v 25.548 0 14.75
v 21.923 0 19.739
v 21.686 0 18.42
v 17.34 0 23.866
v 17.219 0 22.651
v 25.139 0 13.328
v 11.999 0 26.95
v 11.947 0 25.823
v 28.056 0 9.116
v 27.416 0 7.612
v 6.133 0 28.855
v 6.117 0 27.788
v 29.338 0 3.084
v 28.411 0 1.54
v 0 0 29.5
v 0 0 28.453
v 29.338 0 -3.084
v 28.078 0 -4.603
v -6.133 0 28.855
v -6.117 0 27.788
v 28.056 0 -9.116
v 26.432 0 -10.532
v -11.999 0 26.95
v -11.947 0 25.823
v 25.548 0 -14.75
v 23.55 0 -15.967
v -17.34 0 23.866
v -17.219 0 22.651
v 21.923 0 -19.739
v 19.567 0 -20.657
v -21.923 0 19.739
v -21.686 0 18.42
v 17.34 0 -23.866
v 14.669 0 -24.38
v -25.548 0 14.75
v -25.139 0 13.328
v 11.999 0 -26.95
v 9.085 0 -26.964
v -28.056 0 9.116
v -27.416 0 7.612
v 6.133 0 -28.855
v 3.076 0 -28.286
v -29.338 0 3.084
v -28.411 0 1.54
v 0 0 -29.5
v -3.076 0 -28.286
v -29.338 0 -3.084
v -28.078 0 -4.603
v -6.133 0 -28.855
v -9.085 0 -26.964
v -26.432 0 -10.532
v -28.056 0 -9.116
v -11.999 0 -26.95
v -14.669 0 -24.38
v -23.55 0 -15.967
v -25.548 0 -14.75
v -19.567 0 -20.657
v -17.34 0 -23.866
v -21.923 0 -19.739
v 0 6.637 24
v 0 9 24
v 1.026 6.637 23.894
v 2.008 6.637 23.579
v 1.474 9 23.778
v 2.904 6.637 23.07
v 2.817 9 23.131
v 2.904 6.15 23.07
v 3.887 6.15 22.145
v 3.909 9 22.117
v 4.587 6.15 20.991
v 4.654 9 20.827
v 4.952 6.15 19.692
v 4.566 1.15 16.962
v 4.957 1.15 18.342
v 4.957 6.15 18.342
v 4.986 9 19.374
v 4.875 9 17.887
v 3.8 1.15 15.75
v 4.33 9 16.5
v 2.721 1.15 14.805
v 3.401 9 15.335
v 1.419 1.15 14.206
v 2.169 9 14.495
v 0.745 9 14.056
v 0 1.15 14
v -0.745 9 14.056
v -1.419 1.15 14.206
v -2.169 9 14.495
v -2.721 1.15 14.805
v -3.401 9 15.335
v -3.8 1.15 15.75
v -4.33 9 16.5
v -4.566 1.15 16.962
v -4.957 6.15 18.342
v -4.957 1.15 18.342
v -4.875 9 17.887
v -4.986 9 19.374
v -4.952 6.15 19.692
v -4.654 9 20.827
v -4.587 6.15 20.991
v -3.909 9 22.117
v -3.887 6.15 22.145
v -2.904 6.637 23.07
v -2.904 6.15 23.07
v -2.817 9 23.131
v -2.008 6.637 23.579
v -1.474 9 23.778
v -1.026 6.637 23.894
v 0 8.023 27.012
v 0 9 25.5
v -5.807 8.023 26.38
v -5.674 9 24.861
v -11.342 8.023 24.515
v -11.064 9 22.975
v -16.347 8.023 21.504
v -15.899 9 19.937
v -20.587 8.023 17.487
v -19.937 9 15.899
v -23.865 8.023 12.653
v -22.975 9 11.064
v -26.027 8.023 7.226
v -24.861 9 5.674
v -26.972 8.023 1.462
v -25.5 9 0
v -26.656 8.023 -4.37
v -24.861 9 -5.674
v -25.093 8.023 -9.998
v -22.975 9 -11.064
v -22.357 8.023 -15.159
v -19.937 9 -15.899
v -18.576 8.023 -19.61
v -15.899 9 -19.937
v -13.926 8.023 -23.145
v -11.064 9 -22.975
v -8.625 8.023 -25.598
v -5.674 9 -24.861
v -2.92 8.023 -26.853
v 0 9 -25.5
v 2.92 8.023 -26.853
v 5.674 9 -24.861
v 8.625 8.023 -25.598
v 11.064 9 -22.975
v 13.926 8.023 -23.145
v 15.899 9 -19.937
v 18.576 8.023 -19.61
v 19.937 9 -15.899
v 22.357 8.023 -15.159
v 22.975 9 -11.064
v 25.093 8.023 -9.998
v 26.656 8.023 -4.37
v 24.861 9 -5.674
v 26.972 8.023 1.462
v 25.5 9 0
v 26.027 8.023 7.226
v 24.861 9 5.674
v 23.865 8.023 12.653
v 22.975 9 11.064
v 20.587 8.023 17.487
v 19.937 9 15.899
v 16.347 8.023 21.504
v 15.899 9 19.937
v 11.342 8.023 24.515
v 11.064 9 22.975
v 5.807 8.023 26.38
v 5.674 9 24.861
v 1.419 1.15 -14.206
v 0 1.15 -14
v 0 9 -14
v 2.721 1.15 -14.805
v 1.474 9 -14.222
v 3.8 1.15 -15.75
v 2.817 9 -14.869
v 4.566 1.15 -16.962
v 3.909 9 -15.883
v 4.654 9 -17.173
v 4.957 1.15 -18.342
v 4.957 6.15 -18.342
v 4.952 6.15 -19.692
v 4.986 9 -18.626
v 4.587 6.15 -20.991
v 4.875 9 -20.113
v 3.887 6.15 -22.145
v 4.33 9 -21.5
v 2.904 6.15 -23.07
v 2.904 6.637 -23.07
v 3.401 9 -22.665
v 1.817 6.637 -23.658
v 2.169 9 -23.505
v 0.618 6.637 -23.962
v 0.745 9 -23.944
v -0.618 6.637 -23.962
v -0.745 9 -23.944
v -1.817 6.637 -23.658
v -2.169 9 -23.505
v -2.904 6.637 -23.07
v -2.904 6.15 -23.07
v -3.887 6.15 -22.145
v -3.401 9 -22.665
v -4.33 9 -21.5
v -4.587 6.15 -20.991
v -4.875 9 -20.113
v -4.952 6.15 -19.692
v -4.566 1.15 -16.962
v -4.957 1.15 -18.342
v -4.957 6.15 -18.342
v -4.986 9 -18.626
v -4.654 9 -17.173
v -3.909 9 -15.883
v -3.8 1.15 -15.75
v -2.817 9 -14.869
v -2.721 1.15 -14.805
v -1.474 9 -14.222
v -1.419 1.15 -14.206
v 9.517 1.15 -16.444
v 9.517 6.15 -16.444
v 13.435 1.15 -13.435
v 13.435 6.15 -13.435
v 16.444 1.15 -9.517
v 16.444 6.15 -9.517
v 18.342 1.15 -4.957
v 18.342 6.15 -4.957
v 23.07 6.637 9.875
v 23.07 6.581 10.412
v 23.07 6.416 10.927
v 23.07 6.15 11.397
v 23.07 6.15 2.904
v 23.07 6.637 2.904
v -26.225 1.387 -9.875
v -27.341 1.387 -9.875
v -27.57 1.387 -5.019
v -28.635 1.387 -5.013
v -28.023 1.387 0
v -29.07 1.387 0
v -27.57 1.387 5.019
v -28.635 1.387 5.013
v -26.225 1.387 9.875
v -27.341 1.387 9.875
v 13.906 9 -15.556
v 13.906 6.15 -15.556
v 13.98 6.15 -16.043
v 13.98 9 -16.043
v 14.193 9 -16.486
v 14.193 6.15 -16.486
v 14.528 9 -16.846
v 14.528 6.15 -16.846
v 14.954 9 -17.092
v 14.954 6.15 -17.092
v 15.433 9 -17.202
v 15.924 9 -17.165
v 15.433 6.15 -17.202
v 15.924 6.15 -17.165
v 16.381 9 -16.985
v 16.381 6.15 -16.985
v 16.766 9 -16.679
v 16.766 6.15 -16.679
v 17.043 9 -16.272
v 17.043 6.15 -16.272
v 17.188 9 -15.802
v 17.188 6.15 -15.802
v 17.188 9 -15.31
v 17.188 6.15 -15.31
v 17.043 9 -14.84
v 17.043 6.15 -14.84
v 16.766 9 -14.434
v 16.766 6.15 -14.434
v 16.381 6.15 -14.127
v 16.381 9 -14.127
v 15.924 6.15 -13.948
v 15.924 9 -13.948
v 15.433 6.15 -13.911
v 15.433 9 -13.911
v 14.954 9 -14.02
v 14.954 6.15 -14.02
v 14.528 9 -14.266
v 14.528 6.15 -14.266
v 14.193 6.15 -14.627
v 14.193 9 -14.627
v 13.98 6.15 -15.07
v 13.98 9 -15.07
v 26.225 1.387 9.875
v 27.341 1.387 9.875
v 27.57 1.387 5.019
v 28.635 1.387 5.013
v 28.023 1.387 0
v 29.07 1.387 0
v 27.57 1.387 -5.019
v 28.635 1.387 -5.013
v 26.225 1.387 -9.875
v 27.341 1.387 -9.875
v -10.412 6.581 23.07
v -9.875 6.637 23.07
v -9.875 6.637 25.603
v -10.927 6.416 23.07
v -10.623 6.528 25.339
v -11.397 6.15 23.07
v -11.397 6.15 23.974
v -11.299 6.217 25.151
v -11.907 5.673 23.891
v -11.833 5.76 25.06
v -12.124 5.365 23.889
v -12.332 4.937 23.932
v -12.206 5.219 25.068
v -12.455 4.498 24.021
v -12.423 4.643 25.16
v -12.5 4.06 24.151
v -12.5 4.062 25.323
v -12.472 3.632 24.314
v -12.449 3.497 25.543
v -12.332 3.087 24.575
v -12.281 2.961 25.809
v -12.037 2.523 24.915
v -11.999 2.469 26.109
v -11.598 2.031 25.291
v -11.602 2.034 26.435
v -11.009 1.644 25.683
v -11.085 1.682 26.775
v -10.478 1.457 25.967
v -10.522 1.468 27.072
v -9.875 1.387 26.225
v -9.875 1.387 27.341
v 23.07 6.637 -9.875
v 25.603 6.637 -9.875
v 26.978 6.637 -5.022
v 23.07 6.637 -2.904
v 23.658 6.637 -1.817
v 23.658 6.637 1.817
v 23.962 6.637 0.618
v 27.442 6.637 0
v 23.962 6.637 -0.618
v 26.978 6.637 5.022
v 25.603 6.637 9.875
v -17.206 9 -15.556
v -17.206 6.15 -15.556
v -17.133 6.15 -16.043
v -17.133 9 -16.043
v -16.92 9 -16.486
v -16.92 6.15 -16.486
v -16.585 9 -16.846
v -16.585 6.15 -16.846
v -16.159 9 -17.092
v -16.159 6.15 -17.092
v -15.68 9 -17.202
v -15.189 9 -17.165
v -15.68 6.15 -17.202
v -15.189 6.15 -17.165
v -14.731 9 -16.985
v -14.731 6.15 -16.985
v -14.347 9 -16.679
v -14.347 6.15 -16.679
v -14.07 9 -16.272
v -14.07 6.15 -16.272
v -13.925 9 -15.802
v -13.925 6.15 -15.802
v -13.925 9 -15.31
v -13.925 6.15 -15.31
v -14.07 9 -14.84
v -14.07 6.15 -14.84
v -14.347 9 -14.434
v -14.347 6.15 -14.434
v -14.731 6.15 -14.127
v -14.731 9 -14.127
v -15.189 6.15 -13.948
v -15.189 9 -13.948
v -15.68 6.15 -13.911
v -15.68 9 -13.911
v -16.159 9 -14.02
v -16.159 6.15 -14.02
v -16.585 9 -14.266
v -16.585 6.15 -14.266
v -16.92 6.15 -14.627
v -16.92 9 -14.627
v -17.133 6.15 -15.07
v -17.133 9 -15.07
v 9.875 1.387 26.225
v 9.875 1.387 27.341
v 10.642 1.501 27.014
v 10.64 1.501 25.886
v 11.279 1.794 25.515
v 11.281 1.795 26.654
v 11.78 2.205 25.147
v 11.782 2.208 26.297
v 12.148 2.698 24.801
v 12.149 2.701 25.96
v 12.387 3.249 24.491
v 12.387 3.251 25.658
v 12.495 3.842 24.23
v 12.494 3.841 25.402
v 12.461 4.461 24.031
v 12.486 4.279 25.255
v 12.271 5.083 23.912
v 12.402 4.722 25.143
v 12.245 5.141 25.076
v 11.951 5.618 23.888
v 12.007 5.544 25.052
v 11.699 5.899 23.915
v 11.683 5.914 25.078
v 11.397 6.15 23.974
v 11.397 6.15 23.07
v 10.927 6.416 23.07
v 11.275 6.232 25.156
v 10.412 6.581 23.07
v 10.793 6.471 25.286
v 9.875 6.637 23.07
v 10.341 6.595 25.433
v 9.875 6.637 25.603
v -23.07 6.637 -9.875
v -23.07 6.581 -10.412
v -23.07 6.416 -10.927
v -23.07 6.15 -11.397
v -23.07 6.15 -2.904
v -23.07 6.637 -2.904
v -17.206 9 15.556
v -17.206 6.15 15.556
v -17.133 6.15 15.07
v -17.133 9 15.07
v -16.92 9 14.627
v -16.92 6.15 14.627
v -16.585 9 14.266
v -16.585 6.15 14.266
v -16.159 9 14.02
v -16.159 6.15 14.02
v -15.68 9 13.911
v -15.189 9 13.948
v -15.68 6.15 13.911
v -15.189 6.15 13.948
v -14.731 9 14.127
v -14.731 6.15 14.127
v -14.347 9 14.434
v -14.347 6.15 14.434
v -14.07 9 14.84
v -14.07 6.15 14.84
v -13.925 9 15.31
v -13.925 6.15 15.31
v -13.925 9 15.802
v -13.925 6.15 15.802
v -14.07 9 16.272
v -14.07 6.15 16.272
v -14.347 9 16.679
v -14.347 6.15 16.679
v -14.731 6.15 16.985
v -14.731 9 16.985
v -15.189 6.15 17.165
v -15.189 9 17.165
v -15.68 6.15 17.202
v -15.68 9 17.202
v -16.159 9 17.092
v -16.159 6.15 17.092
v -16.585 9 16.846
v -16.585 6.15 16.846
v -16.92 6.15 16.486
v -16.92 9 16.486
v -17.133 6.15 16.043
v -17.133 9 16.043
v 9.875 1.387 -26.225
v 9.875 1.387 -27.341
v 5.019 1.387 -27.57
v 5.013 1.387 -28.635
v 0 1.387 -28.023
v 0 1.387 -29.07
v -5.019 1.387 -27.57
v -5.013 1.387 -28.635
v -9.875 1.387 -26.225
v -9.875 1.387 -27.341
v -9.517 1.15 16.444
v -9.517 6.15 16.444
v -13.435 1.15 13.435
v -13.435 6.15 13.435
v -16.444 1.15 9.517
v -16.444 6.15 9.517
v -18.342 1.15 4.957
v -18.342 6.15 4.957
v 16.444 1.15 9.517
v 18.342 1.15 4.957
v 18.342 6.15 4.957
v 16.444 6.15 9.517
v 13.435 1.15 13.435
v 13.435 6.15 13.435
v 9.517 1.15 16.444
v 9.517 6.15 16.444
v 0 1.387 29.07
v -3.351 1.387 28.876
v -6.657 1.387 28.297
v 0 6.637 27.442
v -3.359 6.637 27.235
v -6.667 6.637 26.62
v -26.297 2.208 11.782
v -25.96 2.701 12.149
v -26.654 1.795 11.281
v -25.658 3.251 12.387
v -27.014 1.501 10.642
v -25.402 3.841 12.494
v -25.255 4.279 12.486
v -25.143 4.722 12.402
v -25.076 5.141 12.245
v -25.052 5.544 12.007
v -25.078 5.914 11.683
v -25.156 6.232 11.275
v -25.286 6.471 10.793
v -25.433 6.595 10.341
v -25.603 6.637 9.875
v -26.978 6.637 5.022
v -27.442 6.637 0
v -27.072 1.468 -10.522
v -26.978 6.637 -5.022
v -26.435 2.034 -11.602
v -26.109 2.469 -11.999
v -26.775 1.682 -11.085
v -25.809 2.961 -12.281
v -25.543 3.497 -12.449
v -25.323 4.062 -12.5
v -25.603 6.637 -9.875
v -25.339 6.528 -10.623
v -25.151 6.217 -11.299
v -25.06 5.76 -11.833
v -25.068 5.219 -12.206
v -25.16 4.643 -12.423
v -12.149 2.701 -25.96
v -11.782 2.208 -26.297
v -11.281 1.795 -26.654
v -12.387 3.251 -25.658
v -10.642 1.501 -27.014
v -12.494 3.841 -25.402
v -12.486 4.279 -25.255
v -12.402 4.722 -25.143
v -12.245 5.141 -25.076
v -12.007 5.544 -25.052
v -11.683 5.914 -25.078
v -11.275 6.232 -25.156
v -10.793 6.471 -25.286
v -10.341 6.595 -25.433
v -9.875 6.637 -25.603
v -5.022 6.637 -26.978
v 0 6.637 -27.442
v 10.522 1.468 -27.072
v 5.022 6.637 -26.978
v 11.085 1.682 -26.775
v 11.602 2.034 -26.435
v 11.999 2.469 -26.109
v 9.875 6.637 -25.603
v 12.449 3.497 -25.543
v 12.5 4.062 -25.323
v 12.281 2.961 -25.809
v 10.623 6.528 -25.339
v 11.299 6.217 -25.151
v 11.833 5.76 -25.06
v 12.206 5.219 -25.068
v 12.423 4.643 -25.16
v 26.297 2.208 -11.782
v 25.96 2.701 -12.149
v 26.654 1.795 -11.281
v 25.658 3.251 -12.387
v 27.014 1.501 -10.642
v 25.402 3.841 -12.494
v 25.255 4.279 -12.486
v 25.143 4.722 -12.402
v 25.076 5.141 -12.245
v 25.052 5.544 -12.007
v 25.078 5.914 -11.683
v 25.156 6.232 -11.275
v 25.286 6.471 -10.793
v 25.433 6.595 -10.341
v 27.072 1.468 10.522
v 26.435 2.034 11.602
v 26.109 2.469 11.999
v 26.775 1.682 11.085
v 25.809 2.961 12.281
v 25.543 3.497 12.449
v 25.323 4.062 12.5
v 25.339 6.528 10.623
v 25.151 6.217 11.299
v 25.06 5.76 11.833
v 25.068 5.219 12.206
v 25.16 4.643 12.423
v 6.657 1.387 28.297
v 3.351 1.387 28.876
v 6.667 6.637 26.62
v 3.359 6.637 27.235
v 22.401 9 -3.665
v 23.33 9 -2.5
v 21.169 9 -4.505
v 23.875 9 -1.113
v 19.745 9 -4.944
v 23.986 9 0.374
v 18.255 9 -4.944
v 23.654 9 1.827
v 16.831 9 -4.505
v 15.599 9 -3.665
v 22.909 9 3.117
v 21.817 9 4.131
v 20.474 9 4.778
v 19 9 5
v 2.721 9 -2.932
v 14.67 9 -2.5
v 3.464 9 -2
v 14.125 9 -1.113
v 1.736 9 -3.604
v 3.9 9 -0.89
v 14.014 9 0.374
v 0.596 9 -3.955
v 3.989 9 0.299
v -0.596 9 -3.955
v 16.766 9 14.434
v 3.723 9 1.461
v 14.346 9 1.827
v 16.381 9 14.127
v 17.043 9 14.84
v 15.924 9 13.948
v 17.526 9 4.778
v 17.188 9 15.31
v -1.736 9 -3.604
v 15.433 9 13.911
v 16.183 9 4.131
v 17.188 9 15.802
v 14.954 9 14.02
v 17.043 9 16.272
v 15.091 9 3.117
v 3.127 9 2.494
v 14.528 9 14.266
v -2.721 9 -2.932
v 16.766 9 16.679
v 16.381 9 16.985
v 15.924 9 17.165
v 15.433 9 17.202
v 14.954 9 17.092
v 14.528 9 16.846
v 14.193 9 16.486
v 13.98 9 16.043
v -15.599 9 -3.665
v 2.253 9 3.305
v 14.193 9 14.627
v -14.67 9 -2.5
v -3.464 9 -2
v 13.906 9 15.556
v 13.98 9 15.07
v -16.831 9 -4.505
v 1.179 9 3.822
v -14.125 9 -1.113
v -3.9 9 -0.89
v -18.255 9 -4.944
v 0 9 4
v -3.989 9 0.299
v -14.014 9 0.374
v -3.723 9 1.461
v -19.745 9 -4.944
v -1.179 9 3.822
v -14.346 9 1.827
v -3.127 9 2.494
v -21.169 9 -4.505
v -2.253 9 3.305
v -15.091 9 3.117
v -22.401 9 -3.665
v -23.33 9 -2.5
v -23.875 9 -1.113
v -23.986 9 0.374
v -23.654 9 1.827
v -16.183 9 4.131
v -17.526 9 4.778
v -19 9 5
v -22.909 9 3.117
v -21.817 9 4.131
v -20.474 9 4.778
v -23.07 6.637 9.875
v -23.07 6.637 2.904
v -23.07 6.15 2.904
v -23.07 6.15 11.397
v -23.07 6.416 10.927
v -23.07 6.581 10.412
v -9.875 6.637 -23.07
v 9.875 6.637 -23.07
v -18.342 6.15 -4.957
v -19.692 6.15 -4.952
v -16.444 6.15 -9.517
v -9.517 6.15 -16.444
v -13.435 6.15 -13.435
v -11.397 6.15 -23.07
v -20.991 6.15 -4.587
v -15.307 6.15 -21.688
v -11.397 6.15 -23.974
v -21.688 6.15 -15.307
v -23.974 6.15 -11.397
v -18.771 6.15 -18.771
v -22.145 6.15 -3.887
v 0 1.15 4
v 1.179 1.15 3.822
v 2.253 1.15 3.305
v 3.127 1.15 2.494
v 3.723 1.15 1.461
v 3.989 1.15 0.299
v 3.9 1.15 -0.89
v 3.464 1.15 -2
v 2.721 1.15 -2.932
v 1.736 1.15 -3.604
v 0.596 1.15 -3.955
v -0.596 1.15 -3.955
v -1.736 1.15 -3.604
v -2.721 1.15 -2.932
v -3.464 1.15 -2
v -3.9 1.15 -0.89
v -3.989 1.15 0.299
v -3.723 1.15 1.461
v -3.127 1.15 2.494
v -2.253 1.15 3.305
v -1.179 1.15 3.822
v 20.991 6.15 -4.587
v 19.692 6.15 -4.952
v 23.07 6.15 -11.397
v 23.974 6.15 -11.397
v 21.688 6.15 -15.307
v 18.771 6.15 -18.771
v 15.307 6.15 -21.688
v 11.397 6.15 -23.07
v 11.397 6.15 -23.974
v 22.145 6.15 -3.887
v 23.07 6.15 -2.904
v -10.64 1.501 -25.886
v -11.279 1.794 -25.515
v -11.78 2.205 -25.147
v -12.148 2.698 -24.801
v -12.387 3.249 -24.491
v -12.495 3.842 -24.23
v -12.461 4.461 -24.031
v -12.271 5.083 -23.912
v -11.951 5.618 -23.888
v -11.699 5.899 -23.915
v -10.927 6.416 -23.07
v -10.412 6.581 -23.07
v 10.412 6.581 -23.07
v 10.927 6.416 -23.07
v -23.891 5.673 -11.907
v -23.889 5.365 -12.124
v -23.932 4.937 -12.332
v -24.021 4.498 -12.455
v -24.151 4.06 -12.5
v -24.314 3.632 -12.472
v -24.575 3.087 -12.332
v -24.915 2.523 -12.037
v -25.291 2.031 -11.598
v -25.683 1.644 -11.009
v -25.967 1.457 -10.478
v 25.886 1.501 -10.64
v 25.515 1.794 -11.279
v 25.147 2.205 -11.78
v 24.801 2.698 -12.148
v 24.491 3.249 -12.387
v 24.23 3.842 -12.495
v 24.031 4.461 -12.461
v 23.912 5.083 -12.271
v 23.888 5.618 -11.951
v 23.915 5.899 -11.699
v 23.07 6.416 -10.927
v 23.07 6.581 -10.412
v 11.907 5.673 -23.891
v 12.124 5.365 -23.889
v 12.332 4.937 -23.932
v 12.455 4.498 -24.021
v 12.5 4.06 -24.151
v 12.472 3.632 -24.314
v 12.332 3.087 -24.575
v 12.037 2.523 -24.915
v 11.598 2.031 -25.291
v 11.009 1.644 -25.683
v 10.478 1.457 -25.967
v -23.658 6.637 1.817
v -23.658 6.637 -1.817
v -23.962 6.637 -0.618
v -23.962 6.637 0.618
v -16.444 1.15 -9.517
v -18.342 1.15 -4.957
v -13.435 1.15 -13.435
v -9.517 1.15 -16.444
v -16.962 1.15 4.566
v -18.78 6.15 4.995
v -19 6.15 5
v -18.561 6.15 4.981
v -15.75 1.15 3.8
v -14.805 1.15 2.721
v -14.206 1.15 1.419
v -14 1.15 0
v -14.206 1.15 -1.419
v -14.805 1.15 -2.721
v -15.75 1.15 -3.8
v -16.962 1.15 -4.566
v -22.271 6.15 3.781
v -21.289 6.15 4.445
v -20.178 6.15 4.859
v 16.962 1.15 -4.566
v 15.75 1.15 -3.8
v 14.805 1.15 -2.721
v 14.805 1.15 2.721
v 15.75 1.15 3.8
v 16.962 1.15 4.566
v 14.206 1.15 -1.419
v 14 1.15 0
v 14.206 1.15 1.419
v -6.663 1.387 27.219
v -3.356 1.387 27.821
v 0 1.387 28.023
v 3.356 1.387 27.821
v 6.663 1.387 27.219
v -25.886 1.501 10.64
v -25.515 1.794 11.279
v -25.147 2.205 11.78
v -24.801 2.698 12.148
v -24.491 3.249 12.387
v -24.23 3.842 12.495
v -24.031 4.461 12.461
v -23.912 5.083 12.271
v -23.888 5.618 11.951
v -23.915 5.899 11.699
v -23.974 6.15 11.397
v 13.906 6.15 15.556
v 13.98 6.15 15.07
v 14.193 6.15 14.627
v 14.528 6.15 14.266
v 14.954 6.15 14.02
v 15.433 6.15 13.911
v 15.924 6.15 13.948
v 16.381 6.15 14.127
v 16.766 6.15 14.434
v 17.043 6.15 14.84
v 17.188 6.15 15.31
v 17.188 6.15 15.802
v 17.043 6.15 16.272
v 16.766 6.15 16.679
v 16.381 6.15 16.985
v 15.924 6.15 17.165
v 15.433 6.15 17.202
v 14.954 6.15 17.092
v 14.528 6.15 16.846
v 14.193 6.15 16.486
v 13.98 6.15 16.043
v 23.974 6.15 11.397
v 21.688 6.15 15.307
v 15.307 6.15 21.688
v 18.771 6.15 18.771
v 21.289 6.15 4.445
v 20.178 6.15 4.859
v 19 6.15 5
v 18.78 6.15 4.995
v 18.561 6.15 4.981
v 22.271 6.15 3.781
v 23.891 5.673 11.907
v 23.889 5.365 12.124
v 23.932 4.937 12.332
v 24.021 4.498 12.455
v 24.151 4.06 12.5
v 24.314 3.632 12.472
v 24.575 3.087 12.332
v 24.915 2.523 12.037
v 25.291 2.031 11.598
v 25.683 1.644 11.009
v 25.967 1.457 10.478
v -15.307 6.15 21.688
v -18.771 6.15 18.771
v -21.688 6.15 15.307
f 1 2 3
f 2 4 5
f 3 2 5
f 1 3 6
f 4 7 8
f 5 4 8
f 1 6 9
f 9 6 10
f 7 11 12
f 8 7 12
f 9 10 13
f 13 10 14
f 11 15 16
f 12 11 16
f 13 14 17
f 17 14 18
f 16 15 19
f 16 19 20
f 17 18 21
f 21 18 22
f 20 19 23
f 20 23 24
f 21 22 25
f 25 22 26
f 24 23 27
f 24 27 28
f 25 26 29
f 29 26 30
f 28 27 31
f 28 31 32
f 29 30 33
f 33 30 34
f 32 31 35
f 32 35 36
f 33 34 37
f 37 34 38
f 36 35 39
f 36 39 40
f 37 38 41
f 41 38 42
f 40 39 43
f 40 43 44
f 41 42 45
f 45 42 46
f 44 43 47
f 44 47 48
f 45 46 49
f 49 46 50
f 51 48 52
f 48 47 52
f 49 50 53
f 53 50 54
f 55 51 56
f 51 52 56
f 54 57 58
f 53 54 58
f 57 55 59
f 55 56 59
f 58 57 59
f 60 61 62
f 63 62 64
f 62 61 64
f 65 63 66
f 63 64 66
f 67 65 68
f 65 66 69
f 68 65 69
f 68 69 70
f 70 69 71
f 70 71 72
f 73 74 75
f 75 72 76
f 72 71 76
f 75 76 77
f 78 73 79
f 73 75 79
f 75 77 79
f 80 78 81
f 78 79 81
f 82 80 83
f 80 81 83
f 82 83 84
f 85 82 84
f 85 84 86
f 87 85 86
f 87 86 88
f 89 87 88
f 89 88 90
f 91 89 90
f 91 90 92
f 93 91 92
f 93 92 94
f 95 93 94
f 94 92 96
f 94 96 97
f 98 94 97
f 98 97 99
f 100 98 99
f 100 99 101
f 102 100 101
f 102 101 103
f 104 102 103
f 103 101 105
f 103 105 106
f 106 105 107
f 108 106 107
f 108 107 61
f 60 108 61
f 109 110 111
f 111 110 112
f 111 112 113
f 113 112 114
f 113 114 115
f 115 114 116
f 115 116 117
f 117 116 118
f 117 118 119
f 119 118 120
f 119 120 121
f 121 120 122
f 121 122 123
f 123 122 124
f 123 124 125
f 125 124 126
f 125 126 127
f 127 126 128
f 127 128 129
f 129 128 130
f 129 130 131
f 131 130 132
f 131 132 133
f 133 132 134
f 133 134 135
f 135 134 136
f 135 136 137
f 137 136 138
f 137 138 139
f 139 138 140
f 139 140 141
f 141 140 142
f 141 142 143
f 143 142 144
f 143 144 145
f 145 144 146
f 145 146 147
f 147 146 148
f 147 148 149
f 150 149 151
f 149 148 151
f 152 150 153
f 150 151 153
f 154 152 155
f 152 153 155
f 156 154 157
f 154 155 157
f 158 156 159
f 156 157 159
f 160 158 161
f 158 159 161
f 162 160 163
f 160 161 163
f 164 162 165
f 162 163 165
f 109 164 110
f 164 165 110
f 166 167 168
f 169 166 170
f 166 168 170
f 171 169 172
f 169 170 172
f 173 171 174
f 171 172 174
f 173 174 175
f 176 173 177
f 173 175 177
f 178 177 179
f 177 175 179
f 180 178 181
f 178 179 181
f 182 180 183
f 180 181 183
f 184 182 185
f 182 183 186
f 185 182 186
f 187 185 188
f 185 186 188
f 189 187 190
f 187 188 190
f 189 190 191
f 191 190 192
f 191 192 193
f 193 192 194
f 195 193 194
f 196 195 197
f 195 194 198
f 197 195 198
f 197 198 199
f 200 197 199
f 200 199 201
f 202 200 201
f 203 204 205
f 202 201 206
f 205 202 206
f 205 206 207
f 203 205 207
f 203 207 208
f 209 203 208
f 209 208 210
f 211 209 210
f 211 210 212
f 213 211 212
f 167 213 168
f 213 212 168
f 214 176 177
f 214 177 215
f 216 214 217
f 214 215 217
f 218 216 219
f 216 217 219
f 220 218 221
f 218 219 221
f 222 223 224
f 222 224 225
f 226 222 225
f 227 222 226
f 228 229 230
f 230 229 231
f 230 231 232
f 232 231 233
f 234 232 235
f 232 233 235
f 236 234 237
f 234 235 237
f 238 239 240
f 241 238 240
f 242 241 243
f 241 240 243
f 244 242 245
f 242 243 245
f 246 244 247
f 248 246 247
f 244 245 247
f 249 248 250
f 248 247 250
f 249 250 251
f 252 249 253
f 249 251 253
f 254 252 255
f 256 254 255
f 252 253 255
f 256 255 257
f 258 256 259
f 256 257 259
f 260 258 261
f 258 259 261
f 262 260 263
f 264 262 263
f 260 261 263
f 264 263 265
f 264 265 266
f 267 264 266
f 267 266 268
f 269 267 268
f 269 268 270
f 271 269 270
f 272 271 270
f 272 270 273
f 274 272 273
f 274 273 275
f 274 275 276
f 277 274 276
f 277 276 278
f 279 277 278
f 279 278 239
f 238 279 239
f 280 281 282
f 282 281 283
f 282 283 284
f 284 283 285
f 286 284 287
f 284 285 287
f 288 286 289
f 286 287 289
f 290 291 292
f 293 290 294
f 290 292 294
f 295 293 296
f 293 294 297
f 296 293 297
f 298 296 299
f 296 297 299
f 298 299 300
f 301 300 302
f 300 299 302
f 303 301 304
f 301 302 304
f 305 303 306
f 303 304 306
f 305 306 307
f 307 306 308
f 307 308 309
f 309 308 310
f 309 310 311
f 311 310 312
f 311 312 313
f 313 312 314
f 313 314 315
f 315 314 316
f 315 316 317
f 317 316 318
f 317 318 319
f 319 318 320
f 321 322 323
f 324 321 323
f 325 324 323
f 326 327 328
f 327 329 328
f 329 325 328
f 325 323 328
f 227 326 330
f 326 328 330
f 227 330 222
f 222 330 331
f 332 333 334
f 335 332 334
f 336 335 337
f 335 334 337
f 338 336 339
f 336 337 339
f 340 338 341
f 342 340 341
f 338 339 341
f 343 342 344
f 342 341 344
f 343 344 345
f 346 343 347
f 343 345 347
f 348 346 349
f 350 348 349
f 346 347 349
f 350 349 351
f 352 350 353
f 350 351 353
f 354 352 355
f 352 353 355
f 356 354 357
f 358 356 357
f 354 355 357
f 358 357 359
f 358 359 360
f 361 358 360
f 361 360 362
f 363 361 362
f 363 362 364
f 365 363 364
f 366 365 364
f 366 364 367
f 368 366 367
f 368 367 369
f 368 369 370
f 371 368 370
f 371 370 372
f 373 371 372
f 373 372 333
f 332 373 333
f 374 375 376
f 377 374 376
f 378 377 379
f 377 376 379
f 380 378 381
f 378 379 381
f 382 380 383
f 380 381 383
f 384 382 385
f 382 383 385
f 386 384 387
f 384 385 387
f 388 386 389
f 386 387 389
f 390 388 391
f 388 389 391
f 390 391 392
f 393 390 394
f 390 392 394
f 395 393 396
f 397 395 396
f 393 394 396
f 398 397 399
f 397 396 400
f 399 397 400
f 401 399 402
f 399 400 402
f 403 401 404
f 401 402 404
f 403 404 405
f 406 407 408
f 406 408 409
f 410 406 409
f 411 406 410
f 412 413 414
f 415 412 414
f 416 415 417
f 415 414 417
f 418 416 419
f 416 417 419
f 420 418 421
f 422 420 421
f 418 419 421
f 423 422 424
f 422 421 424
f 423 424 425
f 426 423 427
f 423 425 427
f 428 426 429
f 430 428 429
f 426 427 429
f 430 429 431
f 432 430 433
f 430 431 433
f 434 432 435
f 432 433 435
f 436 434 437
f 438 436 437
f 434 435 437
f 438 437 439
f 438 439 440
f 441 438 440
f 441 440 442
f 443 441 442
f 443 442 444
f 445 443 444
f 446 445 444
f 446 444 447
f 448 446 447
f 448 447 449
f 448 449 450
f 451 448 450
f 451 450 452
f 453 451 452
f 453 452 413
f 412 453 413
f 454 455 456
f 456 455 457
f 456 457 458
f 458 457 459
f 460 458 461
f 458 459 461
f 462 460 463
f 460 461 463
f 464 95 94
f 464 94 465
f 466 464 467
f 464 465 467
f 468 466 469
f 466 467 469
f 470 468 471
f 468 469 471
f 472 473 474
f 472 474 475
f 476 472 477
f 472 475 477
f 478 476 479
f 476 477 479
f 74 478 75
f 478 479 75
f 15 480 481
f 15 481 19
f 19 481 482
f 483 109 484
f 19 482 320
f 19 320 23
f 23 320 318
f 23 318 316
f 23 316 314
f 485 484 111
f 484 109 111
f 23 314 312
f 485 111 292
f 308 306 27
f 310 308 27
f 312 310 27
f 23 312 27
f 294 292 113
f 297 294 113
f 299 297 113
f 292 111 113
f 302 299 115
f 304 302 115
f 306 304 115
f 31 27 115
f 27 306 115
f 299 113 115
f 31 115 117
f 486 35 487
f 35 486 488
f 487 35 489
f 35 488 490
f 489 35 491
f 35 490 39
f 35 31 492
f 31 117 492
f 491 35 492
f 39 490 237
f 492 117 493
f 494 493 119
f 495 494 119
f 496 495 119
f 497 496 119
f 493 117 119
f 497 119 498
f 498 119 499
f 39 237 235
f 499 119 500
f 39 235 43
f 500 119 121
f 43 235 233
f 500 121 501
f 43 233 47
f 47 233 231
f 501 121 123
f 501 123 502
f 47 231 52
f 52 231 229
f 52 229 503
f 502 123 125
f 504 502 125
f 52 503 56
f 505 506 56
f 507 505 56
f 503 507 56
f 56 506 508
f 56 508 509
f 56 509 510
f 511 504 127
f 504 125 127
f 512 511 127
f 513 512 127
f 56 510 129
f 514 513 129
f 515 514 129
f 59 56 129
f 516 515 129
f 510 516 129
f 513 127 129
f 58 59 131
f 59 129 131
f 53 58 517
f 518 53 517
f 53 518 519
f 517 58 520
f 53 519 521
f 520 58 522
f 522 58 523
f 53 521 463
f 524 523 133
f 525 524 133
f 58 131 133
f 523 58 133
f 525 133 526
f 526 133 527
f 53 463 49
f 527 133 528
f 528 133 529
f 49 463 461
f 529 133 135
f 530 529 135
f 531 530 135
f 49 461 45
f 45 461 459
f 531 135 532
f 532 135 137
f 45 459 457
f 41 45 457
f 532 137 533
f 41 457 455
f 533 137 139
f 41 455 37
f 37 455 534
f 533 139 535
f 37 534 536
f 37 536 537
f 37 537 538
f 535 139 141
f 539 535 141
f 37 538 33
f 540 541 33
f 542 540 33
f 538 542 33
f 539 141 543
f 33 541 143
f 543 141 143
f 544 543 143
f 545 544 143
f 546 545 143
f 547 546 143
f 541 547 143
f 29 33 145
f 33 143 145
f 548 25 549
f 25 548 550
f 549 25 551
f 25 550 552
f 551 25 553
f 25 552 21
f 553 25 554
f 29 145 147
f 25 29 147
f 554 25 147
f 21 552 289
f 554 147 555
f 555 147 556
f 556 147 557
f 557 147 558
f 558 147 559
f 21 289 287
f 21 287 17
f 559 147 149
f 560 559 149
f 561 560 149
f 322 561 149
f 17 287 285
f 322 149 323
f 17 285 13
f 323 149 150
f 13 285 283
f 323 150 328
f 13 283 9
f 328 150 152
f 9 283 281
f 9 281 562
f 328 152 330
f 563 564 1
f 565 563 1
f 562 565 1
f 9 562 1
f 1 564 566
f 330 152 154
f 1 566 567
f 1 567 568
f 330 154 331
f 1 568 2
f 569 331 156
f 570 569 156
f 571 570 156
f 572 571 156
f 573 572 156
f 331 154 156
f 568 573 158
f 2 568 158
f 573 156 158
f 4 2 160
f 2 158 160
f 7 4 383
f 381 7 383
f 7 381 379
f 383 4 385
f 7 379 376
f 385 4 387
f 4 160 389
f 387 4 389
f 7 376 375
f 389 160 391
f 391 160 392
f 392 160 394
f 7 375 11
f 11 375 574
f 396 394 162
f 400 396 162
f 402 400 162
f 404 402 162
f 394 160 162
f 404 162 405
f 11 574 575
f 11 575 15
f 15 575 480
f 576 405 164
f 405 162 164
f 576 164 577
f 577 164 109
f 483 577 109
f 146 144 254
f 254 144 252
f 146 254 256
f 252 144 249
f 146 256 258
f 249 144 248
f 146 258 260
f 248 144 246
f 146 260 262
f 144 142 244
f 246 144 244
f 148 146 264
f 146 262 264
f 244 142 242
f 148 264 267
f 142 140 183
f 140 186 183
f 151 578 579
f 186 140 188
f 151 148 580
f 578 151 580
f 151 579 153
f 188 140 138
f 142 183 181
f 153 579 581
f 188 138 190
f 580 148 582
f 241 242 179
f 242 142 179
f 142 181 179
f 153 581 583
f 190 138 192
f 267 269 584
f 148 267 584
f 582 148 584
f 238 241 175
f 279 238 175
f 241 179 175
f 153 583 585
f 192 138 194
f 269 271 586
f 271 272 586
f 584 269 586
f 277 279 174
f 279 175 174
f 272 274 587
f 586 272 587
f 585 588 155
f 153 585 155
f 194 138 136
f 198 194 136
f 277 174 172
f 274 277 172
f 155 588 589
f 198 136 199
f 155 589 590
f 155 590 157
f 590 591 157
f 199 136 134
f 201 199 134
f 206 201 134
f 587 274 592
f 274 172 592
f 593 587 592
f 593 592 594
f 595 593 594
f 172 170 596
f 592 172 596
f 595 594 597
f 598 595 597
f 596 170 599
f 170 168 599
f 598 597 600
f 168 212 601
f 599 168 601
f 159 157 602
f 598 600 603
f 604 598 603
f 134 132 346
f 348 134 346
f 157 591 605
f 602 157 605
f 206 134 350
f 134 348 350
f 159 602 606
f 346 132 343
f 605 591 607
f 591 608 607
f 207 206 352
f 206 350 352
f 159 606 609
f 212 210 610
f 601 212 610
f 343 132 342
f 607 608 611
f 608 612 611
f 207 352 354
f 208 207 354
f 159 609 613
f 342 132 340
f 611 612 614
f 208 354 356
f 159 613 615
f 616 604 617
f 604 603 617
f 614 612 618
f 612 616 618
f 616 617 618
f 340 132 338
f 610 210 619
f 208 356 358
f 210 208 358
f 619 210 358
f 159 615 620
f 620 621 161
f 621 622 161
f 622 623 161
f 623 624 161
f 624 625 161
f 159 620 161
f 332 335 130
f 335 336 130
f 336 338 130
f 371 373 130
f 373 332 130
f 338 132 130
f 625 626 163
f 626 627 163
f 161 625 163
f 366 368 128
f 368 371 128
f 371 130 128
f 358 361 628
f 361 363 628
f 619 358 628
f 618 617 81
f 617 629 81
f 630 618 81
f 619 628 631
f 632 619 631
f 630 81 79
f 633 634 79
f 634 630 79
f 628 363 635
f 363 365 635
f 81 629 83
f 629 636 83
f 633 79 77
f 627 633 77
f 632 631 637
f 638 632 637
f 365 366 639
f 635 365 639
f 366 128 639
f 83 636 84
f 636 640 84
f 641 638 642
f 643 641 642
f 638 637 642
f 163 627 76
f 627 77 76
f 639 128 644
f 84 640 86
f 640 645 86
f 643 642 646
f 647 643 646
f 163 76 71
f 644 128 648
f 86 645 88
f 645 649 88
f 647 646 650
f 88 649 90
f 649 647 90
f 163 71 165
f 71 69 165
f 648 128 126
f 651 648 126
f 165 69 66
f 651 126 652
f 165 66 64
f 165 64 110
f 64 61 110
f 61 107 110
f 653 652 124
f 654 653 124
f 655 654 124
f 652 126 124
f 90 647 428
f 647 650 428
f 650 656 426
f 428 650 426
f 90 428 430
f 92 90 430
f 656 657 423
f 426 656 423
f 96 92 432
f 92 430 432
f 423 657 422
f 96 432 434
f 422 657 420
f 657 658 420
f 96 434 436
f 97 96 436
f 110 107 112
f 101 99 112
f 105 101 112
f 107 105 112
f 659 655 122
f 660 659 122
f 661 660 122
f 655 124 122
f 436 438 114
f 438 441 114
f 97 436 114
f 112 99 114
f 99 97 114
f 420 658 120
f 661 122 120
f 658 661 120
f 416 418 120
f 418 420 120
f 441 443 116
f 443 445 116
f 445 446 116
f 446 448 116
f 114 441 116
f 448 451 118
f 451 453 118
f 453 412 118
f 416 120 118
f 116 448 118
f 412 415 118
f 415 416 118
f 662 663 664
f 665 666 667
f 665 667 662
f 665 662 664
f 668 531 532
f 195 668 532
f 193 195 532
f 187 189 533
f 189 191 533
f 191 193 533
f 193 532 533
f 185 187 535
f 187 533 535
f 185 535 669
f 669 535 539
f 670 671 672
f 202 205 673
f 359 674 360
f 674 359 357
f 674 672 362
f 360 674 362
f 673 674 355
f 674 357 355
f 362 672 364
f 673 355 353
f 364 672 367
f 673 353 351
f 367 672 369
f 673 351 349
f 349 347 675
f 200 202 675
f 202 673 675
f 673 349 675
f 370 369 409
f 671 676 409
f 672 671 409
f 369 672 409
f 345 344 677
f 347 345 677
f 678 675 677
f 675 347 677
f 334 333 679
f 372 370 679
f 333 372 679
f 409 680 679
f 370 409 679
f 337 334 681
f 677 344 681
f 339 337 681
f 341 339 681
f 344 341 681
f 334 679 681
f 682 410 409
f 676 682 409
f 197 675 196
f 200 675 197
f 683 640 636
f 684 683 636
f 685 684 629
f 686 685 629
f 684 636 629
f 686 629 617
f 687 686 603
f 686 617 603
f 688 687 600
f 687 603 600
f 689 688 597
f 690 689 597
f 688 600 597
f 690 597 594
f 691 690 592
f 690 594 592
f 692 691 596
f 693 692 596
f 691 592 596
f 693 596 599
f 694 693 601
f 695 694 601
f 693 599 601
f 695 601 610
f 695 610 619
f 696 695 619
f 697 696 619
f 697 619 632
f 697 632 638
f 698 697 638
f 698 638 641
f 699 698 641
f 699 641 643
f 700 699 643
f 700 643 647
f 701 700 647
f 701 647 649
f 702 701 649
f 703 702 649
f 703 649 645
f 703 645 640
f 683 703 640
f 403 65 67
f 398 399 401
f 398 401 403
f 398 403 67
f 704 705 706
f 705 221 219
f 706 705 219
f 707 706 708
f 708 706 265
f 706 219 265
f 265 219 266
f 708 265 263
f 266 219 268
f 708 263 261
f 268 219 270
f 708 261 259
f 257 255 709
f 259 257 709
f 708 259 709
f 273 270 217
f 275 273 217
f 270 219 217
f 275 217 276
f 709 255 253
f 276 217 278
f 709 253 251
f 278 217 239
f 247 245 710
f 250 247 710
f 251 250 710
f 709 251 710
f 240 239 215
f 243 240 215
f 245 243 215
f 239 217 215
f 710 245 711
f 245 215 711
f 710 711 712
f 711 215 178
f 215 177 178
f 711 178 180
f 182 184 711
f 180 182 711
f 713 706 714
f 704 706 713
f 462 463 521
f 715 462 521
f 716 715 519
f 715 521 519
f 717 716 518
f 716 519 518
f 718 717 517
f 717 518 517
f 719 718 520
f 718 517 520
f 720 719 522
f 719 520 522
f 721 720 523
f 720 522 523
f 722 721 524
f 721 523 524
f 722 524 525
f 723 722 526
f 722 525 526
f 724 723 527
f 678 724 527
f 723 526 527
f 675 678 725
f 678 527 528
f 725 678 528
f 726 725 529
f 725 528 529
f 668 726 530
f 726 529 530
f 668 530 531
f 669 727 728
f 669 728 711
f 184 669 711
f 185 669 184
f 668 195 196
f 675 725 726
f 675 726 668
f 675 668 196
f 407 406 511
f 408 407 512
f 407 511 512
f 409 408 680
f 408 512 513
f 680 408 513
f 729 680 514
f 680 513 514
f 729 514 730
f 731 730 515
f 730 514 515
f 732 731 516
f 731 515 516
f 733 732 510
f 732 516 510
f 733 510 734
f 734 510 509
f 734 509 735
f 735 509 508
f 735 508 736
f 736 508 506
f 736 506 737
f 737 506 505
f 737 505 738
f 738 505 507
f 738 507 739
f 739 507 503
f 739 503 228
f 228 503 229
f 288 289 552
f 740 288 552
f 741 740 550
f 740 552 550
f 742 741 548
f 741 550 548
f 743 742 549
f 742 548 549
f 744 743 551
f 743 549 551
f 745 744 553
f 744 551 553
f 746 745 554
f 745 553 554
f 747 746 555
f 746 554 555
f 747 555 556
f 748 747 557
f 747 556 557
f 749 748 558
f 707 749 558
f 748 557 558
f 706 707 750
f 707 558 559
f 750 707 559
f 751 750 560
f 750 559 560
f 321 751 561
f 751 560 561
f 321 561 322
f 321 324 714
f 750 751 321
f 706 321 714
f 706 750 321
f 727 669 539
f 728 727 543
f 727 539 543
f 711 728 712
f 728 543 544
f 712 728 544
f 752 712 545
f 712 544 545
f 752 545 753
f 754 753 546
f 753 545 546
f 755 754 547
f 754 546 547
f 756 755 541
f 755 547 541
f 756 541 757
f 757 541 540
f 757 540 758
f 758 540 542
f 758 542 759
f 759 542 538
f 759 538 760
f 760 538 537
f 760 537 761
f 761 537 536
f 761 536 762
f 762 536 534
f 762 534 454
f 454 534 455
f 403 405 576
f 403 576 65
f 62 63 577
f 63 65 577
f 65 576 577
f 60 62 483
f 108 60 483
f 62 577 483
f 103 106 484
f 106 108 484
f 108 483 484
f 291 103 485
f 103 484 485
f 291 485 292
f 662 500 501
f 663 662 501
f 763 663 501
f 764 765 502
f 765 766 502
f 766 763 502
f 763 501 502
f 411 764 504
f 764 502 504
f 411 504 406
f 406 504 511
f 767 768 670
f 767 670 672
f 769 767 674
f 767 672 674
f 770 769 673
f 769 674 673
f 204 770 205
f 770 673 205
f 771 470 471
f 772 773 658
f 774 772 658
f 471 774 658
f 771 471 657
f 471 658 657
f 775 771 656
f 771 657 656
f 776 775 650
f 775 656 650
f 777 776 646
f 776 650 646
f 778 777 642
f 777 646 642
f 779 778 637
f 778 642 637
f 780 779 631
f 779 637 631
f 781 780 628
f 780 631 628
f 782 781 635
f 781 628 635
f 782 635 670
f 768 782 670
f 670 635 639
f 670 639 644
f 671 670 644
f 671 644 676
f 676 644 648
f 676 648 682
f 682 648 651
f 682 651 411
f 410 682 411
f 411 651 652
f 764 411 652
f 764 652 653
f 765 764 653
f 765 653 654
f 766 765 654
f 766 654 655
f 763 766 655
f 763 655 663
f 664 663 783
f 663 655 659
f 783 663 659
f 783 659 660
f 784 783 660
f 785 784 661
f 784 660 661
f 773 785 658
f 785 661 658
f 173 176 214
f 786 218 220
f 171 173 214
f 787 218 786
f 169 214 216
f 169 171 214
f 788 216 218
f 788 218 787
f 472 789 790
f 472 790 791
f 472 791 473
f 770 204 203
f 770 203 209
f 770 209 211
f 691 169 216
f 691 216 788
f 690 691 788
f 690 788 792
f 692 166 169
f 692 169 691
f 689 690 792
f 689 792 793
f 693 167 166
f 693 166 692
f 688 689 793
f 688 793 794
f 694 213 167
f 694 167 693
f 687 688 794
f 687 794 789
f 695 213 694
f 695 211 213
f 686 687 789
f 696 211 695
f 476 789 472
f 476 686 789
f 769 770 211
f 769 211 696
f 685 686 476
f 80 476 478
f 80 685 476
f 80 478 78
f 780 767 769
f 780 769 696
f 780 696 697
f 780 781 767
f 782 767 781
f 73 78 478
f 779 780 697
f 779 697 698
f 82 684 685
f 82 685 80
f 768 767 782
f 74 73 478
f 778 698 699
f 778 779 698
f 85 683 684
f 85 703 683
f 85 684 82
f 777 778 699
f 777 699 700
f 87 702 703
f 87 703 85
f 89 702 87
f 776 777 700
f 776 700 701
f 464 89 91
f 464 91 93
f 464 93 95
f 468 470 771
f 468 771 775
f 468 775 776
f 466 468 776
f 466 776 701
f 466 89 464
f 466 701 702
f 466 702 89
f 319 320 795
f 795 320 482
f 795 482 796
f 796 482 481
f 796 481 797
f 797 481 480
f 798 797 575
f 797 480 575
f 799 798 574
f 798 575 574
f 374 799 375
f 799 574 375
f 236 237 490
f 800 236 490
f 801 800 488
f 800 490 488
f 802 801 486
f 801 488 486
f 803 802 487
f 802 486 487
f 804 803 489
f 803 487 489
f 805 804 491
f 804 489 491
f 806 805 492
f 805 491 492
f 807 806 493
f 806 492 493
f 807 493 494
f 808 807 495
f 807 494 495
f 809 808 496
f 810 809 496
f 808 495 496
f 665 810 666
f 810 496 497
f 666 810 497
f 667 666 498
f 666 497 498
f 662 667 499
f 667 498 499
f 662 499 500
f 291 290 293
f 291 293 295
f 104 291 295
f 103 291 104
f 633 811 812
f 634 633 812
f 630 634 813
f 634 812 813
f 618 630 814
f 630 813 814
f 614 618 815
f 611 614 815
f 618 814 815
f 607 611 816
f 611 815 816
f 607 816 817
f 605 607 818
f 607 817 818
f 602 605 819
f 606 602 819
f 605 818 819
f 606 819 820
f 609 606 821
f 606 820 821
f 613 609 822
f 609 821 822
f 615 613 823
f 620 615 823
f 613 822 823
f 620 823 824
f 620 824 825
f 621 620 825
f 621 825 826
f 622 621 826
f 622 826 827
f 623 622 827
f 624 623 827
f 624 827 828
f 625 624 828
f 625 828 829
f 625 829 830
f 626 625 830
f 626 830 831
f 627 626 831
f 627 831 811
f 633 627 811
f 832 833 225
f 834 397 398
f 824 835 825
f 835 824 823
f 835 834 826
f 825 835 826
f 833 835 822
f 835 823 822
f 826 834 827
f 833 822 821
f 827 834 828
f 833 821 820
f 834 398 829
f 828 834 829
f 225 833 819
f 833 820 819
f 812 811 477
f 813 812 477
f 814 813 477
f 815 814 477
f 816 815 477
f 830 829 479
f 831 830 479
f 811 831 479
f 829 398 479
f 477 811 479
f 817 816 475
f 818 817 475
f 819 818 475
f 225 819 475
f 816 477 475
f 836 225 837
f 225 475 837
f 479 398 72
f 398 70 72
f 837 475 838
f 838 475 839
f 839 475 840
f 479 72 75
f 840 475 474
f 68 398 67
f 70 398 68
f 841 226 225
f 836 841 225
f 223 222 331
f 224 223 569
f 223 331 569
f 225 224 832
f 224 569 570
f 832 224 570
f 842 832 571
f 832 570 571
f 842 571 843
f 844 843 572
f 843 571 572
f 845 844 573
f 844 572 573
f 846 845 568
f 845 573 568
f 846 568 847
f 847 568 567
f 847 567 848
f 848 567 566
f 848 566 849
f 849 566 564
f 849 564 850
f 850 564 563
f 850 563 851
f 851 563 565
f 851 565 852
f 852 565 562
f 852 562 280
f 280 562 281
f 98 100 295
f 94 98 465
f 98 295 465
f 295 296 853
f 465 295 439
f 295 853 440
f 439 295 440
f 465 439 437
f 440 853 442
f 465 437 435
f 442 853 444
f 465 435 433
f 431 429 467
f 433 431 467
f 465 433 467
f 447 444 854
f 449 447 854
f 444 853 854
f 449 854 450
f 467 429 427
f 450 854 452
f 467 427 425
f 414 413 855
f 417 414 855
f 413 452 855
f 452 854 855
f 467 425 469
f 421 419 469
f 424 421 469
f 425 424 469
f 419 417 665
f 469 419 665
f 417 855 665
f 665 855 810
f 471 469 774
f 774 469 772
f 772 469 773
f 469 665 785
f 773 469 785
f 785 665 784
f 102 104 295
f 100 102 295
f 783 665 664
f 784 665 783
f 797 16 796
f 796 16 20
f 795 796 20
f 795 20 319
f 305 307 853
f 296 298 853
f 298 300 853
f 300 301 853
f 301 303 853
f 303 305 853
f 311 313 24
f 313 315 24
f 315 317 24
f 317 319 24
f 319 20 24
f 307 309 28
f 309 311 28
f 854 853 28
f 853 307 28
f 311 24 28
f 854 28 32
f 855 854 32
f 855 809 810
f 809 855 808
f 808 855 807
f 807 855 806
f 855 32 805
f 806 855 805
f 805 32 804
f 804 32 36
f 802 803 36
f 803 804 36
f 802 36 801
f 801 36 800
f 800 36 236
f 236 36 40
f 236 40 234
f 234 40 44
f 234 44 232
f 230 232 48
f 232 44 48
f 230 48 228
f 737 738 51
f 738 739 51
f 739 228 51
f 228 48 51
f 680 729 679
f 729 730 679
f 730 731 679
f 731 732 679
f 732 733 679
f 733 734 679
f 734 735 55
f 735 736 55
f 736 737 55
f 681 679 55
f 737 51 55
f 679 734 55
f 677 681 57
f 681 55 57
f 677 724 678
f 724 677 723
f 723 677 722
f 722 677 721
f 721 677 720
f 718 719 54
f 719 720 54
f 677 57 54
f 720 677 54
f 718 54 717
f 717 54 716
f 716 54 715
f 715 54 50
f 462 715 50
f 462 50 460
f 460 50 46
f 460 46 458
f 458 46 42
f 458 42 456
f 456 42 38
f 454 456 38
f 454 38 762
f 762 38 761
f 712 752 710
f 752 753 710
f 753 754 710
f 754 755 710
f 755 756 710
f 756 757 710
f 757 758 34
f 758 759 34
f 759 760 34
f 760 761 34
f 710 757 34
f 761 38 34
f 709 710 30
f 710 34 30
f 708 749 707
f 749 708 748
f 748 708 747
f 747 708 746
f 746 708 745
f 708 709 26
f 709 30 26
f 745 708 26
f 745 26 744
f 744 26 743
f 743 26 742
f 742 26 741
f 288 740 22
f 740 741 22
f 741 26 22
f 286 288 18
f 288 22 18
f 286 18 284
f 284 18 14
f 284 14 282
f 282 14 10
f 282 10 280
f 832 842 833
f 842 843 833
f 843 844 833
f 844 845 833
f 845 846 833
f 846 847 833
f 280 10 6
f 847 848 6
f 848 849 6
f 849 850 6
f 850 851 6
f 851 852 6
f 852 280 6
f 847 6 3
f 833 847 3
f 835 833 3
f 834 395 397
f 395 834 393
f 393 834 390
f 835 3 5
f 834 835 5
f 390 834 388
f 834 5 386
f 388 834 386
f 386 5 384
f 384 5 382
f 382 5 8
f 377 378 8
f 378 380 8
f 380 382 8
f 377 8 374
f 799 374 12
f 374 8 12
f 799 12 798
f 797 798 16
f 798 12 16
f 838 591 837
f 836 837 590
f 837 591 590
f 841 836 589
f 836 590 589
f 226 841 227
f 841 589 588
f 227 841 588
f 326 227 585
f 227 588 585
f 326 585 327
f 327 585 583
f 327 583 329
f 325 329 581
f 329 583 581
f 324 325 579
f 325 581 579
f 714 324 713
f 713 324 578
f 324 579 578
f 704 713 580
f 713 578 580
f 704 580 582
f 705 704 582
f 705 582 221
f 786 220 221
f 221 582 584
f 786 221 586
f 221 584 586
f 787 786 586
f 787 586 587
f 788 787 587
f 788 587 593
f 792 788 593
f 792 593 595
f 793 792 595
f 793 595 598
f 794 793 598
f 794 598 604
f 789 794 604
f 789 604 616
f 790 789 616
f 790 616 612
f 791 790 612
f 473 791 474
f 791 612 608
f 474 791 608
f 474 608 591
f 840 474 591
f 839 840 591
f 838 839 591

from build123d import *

# Parameters (mm, degrees)
SKETCH2_R             = 19
BOSS_EXTRUDE1_DEPTH   = 5
SKETCH3_R             = 5
CUT_EXTRUDE1_DEPTH    = 43.679034666
SKETCH4_R             = 4
CUT_EXTRUDE2_DEPTH    = 43.679034666
M4X0_7_TAPPED_HOLE1_D = 3.3
CUT_EXTRUDE3_DEPTH    = 6.43
CIRPATTERN1_COUNT     = 4


with BuildPart() as part:
    # Sketch1 → Revolve1 (revolve)
    with BuildSketch(Plane(origin=(0, 0, 0), x_dir=(0, 0, -1), z_dir=(1, 0, 0)), mode=Mode.PRIVATE) as revolve1_sk:
        Polygon((0, 9), (0, 6.15), (26.545687362, 6.15), (28.453012328, 0), (29.5, 0), (27.011788484, 8.023017104), (25.5, 9), align=None)
    revolve(revolve1_sk.sketch.rotate(Axis((0, 9, 0), (0, -1, 0)), 180), axis=Axis((0, 9, 0), (0, -1, 0)))

    # Sketch2 → Boss-Extrude1 (add)
    with BuildSketch(Plane.XZ.offset(-6.15)):
        with Locations(Location((0, 0, 0), (0, 0, 90))):
            Circle(SKETCH2_R)
    extrude(amount=BOSS_EXTRUDE1_DEPTH)

    # Sketch3 → Cut-Extrude1 (cut, through all)
    with BuildSketch(Plane(origin=(0, 9, 0), x_dir=(1, 0, 0), z_dir=(0, 1, 0))):
        with Locations(Location((0, 19, 0), (0, 0, 270))):
            Circle(SKETCH3_R)
        with Locations(Location((19, 0, 0), (0, 0, 270))):
            Circle(SKETCH3_R)
        with Locations(Location((0, -19, 0), (0, 0, 270))):
            Circle(SKETCH3_R)
        with Locations(Location((-19, 0, 0), (0, 0, 270))):
            Circle(SKETCH3_R)
    extrude(amount=-CUT_EXTRUDE1_DEPTH, mode=Mode.SUBTRACT)

    # Sketch4 → Cut-Extrude2 (cut, through all)
    with BuildSketch(Plane(origin=(0, 9, 0), x_dir=(1, 0, 0), z_dir=(0, 1, 0))):
        with Locations(Location((0, 0, 0), (0, 0, 270))):
            Circle(SKETCH4_R)
    extrude(amount=-CUT_EXTRUDE2_DEPTH, mode=Mode.SUBTRACT)

    # M4x0.7 Tapped Hole1 (through all)
    with Locations(Plane(origin=(0, 9, 0), x_dir=(1, 0, 0), z_dir=(0, 1, 0))):
        with Locations((-15.556349186, 15.556349186), (15.556349186, 15.556349186), (15.556349186, -15.556349186), (-15.556349186, -15.556349186)):
            Hole(M4X0_7_TAPPED_HOLE1_D / 2)

    # Sketch9 → Cut-Extrude3 (cut)
    with BuildSketch(Plane.XY.offset(-29.5)):
        with BuildLine():
            Line((-9.875, 6.636508552), (9.875, 6.636508552))
            ThreePointArc((9.875, 6.636508552), (12.5, 4.011508552), (9.875, 1.386508552))
            Line((9.875, 1.386508552), (-9.875, 1.386508552))
            ThreePointArc((-9.875, 1.386508552), (-12.5, 4.011508552), (-9.875, 6.636508552))
        make_face()
    cut_extrude3 = extrude(amount=CUT_EXTRUDE3_DEPTH, mode=Mode.SUBTRACT)

    # CirPattern1: Cut-Extrude3 ×4 about axis
    cirpattern1_axis = Axis((0, 0, 0), (0, 1, 0))
    for i in range(1, CIRPATTERN1_COUNT):
        add(cut_extrude3.rotate(cirpattern1_axis, i * 360 / CIRPATTERN1_COUNT), mode=Mode.SUBTRACT)


solid = part.part
